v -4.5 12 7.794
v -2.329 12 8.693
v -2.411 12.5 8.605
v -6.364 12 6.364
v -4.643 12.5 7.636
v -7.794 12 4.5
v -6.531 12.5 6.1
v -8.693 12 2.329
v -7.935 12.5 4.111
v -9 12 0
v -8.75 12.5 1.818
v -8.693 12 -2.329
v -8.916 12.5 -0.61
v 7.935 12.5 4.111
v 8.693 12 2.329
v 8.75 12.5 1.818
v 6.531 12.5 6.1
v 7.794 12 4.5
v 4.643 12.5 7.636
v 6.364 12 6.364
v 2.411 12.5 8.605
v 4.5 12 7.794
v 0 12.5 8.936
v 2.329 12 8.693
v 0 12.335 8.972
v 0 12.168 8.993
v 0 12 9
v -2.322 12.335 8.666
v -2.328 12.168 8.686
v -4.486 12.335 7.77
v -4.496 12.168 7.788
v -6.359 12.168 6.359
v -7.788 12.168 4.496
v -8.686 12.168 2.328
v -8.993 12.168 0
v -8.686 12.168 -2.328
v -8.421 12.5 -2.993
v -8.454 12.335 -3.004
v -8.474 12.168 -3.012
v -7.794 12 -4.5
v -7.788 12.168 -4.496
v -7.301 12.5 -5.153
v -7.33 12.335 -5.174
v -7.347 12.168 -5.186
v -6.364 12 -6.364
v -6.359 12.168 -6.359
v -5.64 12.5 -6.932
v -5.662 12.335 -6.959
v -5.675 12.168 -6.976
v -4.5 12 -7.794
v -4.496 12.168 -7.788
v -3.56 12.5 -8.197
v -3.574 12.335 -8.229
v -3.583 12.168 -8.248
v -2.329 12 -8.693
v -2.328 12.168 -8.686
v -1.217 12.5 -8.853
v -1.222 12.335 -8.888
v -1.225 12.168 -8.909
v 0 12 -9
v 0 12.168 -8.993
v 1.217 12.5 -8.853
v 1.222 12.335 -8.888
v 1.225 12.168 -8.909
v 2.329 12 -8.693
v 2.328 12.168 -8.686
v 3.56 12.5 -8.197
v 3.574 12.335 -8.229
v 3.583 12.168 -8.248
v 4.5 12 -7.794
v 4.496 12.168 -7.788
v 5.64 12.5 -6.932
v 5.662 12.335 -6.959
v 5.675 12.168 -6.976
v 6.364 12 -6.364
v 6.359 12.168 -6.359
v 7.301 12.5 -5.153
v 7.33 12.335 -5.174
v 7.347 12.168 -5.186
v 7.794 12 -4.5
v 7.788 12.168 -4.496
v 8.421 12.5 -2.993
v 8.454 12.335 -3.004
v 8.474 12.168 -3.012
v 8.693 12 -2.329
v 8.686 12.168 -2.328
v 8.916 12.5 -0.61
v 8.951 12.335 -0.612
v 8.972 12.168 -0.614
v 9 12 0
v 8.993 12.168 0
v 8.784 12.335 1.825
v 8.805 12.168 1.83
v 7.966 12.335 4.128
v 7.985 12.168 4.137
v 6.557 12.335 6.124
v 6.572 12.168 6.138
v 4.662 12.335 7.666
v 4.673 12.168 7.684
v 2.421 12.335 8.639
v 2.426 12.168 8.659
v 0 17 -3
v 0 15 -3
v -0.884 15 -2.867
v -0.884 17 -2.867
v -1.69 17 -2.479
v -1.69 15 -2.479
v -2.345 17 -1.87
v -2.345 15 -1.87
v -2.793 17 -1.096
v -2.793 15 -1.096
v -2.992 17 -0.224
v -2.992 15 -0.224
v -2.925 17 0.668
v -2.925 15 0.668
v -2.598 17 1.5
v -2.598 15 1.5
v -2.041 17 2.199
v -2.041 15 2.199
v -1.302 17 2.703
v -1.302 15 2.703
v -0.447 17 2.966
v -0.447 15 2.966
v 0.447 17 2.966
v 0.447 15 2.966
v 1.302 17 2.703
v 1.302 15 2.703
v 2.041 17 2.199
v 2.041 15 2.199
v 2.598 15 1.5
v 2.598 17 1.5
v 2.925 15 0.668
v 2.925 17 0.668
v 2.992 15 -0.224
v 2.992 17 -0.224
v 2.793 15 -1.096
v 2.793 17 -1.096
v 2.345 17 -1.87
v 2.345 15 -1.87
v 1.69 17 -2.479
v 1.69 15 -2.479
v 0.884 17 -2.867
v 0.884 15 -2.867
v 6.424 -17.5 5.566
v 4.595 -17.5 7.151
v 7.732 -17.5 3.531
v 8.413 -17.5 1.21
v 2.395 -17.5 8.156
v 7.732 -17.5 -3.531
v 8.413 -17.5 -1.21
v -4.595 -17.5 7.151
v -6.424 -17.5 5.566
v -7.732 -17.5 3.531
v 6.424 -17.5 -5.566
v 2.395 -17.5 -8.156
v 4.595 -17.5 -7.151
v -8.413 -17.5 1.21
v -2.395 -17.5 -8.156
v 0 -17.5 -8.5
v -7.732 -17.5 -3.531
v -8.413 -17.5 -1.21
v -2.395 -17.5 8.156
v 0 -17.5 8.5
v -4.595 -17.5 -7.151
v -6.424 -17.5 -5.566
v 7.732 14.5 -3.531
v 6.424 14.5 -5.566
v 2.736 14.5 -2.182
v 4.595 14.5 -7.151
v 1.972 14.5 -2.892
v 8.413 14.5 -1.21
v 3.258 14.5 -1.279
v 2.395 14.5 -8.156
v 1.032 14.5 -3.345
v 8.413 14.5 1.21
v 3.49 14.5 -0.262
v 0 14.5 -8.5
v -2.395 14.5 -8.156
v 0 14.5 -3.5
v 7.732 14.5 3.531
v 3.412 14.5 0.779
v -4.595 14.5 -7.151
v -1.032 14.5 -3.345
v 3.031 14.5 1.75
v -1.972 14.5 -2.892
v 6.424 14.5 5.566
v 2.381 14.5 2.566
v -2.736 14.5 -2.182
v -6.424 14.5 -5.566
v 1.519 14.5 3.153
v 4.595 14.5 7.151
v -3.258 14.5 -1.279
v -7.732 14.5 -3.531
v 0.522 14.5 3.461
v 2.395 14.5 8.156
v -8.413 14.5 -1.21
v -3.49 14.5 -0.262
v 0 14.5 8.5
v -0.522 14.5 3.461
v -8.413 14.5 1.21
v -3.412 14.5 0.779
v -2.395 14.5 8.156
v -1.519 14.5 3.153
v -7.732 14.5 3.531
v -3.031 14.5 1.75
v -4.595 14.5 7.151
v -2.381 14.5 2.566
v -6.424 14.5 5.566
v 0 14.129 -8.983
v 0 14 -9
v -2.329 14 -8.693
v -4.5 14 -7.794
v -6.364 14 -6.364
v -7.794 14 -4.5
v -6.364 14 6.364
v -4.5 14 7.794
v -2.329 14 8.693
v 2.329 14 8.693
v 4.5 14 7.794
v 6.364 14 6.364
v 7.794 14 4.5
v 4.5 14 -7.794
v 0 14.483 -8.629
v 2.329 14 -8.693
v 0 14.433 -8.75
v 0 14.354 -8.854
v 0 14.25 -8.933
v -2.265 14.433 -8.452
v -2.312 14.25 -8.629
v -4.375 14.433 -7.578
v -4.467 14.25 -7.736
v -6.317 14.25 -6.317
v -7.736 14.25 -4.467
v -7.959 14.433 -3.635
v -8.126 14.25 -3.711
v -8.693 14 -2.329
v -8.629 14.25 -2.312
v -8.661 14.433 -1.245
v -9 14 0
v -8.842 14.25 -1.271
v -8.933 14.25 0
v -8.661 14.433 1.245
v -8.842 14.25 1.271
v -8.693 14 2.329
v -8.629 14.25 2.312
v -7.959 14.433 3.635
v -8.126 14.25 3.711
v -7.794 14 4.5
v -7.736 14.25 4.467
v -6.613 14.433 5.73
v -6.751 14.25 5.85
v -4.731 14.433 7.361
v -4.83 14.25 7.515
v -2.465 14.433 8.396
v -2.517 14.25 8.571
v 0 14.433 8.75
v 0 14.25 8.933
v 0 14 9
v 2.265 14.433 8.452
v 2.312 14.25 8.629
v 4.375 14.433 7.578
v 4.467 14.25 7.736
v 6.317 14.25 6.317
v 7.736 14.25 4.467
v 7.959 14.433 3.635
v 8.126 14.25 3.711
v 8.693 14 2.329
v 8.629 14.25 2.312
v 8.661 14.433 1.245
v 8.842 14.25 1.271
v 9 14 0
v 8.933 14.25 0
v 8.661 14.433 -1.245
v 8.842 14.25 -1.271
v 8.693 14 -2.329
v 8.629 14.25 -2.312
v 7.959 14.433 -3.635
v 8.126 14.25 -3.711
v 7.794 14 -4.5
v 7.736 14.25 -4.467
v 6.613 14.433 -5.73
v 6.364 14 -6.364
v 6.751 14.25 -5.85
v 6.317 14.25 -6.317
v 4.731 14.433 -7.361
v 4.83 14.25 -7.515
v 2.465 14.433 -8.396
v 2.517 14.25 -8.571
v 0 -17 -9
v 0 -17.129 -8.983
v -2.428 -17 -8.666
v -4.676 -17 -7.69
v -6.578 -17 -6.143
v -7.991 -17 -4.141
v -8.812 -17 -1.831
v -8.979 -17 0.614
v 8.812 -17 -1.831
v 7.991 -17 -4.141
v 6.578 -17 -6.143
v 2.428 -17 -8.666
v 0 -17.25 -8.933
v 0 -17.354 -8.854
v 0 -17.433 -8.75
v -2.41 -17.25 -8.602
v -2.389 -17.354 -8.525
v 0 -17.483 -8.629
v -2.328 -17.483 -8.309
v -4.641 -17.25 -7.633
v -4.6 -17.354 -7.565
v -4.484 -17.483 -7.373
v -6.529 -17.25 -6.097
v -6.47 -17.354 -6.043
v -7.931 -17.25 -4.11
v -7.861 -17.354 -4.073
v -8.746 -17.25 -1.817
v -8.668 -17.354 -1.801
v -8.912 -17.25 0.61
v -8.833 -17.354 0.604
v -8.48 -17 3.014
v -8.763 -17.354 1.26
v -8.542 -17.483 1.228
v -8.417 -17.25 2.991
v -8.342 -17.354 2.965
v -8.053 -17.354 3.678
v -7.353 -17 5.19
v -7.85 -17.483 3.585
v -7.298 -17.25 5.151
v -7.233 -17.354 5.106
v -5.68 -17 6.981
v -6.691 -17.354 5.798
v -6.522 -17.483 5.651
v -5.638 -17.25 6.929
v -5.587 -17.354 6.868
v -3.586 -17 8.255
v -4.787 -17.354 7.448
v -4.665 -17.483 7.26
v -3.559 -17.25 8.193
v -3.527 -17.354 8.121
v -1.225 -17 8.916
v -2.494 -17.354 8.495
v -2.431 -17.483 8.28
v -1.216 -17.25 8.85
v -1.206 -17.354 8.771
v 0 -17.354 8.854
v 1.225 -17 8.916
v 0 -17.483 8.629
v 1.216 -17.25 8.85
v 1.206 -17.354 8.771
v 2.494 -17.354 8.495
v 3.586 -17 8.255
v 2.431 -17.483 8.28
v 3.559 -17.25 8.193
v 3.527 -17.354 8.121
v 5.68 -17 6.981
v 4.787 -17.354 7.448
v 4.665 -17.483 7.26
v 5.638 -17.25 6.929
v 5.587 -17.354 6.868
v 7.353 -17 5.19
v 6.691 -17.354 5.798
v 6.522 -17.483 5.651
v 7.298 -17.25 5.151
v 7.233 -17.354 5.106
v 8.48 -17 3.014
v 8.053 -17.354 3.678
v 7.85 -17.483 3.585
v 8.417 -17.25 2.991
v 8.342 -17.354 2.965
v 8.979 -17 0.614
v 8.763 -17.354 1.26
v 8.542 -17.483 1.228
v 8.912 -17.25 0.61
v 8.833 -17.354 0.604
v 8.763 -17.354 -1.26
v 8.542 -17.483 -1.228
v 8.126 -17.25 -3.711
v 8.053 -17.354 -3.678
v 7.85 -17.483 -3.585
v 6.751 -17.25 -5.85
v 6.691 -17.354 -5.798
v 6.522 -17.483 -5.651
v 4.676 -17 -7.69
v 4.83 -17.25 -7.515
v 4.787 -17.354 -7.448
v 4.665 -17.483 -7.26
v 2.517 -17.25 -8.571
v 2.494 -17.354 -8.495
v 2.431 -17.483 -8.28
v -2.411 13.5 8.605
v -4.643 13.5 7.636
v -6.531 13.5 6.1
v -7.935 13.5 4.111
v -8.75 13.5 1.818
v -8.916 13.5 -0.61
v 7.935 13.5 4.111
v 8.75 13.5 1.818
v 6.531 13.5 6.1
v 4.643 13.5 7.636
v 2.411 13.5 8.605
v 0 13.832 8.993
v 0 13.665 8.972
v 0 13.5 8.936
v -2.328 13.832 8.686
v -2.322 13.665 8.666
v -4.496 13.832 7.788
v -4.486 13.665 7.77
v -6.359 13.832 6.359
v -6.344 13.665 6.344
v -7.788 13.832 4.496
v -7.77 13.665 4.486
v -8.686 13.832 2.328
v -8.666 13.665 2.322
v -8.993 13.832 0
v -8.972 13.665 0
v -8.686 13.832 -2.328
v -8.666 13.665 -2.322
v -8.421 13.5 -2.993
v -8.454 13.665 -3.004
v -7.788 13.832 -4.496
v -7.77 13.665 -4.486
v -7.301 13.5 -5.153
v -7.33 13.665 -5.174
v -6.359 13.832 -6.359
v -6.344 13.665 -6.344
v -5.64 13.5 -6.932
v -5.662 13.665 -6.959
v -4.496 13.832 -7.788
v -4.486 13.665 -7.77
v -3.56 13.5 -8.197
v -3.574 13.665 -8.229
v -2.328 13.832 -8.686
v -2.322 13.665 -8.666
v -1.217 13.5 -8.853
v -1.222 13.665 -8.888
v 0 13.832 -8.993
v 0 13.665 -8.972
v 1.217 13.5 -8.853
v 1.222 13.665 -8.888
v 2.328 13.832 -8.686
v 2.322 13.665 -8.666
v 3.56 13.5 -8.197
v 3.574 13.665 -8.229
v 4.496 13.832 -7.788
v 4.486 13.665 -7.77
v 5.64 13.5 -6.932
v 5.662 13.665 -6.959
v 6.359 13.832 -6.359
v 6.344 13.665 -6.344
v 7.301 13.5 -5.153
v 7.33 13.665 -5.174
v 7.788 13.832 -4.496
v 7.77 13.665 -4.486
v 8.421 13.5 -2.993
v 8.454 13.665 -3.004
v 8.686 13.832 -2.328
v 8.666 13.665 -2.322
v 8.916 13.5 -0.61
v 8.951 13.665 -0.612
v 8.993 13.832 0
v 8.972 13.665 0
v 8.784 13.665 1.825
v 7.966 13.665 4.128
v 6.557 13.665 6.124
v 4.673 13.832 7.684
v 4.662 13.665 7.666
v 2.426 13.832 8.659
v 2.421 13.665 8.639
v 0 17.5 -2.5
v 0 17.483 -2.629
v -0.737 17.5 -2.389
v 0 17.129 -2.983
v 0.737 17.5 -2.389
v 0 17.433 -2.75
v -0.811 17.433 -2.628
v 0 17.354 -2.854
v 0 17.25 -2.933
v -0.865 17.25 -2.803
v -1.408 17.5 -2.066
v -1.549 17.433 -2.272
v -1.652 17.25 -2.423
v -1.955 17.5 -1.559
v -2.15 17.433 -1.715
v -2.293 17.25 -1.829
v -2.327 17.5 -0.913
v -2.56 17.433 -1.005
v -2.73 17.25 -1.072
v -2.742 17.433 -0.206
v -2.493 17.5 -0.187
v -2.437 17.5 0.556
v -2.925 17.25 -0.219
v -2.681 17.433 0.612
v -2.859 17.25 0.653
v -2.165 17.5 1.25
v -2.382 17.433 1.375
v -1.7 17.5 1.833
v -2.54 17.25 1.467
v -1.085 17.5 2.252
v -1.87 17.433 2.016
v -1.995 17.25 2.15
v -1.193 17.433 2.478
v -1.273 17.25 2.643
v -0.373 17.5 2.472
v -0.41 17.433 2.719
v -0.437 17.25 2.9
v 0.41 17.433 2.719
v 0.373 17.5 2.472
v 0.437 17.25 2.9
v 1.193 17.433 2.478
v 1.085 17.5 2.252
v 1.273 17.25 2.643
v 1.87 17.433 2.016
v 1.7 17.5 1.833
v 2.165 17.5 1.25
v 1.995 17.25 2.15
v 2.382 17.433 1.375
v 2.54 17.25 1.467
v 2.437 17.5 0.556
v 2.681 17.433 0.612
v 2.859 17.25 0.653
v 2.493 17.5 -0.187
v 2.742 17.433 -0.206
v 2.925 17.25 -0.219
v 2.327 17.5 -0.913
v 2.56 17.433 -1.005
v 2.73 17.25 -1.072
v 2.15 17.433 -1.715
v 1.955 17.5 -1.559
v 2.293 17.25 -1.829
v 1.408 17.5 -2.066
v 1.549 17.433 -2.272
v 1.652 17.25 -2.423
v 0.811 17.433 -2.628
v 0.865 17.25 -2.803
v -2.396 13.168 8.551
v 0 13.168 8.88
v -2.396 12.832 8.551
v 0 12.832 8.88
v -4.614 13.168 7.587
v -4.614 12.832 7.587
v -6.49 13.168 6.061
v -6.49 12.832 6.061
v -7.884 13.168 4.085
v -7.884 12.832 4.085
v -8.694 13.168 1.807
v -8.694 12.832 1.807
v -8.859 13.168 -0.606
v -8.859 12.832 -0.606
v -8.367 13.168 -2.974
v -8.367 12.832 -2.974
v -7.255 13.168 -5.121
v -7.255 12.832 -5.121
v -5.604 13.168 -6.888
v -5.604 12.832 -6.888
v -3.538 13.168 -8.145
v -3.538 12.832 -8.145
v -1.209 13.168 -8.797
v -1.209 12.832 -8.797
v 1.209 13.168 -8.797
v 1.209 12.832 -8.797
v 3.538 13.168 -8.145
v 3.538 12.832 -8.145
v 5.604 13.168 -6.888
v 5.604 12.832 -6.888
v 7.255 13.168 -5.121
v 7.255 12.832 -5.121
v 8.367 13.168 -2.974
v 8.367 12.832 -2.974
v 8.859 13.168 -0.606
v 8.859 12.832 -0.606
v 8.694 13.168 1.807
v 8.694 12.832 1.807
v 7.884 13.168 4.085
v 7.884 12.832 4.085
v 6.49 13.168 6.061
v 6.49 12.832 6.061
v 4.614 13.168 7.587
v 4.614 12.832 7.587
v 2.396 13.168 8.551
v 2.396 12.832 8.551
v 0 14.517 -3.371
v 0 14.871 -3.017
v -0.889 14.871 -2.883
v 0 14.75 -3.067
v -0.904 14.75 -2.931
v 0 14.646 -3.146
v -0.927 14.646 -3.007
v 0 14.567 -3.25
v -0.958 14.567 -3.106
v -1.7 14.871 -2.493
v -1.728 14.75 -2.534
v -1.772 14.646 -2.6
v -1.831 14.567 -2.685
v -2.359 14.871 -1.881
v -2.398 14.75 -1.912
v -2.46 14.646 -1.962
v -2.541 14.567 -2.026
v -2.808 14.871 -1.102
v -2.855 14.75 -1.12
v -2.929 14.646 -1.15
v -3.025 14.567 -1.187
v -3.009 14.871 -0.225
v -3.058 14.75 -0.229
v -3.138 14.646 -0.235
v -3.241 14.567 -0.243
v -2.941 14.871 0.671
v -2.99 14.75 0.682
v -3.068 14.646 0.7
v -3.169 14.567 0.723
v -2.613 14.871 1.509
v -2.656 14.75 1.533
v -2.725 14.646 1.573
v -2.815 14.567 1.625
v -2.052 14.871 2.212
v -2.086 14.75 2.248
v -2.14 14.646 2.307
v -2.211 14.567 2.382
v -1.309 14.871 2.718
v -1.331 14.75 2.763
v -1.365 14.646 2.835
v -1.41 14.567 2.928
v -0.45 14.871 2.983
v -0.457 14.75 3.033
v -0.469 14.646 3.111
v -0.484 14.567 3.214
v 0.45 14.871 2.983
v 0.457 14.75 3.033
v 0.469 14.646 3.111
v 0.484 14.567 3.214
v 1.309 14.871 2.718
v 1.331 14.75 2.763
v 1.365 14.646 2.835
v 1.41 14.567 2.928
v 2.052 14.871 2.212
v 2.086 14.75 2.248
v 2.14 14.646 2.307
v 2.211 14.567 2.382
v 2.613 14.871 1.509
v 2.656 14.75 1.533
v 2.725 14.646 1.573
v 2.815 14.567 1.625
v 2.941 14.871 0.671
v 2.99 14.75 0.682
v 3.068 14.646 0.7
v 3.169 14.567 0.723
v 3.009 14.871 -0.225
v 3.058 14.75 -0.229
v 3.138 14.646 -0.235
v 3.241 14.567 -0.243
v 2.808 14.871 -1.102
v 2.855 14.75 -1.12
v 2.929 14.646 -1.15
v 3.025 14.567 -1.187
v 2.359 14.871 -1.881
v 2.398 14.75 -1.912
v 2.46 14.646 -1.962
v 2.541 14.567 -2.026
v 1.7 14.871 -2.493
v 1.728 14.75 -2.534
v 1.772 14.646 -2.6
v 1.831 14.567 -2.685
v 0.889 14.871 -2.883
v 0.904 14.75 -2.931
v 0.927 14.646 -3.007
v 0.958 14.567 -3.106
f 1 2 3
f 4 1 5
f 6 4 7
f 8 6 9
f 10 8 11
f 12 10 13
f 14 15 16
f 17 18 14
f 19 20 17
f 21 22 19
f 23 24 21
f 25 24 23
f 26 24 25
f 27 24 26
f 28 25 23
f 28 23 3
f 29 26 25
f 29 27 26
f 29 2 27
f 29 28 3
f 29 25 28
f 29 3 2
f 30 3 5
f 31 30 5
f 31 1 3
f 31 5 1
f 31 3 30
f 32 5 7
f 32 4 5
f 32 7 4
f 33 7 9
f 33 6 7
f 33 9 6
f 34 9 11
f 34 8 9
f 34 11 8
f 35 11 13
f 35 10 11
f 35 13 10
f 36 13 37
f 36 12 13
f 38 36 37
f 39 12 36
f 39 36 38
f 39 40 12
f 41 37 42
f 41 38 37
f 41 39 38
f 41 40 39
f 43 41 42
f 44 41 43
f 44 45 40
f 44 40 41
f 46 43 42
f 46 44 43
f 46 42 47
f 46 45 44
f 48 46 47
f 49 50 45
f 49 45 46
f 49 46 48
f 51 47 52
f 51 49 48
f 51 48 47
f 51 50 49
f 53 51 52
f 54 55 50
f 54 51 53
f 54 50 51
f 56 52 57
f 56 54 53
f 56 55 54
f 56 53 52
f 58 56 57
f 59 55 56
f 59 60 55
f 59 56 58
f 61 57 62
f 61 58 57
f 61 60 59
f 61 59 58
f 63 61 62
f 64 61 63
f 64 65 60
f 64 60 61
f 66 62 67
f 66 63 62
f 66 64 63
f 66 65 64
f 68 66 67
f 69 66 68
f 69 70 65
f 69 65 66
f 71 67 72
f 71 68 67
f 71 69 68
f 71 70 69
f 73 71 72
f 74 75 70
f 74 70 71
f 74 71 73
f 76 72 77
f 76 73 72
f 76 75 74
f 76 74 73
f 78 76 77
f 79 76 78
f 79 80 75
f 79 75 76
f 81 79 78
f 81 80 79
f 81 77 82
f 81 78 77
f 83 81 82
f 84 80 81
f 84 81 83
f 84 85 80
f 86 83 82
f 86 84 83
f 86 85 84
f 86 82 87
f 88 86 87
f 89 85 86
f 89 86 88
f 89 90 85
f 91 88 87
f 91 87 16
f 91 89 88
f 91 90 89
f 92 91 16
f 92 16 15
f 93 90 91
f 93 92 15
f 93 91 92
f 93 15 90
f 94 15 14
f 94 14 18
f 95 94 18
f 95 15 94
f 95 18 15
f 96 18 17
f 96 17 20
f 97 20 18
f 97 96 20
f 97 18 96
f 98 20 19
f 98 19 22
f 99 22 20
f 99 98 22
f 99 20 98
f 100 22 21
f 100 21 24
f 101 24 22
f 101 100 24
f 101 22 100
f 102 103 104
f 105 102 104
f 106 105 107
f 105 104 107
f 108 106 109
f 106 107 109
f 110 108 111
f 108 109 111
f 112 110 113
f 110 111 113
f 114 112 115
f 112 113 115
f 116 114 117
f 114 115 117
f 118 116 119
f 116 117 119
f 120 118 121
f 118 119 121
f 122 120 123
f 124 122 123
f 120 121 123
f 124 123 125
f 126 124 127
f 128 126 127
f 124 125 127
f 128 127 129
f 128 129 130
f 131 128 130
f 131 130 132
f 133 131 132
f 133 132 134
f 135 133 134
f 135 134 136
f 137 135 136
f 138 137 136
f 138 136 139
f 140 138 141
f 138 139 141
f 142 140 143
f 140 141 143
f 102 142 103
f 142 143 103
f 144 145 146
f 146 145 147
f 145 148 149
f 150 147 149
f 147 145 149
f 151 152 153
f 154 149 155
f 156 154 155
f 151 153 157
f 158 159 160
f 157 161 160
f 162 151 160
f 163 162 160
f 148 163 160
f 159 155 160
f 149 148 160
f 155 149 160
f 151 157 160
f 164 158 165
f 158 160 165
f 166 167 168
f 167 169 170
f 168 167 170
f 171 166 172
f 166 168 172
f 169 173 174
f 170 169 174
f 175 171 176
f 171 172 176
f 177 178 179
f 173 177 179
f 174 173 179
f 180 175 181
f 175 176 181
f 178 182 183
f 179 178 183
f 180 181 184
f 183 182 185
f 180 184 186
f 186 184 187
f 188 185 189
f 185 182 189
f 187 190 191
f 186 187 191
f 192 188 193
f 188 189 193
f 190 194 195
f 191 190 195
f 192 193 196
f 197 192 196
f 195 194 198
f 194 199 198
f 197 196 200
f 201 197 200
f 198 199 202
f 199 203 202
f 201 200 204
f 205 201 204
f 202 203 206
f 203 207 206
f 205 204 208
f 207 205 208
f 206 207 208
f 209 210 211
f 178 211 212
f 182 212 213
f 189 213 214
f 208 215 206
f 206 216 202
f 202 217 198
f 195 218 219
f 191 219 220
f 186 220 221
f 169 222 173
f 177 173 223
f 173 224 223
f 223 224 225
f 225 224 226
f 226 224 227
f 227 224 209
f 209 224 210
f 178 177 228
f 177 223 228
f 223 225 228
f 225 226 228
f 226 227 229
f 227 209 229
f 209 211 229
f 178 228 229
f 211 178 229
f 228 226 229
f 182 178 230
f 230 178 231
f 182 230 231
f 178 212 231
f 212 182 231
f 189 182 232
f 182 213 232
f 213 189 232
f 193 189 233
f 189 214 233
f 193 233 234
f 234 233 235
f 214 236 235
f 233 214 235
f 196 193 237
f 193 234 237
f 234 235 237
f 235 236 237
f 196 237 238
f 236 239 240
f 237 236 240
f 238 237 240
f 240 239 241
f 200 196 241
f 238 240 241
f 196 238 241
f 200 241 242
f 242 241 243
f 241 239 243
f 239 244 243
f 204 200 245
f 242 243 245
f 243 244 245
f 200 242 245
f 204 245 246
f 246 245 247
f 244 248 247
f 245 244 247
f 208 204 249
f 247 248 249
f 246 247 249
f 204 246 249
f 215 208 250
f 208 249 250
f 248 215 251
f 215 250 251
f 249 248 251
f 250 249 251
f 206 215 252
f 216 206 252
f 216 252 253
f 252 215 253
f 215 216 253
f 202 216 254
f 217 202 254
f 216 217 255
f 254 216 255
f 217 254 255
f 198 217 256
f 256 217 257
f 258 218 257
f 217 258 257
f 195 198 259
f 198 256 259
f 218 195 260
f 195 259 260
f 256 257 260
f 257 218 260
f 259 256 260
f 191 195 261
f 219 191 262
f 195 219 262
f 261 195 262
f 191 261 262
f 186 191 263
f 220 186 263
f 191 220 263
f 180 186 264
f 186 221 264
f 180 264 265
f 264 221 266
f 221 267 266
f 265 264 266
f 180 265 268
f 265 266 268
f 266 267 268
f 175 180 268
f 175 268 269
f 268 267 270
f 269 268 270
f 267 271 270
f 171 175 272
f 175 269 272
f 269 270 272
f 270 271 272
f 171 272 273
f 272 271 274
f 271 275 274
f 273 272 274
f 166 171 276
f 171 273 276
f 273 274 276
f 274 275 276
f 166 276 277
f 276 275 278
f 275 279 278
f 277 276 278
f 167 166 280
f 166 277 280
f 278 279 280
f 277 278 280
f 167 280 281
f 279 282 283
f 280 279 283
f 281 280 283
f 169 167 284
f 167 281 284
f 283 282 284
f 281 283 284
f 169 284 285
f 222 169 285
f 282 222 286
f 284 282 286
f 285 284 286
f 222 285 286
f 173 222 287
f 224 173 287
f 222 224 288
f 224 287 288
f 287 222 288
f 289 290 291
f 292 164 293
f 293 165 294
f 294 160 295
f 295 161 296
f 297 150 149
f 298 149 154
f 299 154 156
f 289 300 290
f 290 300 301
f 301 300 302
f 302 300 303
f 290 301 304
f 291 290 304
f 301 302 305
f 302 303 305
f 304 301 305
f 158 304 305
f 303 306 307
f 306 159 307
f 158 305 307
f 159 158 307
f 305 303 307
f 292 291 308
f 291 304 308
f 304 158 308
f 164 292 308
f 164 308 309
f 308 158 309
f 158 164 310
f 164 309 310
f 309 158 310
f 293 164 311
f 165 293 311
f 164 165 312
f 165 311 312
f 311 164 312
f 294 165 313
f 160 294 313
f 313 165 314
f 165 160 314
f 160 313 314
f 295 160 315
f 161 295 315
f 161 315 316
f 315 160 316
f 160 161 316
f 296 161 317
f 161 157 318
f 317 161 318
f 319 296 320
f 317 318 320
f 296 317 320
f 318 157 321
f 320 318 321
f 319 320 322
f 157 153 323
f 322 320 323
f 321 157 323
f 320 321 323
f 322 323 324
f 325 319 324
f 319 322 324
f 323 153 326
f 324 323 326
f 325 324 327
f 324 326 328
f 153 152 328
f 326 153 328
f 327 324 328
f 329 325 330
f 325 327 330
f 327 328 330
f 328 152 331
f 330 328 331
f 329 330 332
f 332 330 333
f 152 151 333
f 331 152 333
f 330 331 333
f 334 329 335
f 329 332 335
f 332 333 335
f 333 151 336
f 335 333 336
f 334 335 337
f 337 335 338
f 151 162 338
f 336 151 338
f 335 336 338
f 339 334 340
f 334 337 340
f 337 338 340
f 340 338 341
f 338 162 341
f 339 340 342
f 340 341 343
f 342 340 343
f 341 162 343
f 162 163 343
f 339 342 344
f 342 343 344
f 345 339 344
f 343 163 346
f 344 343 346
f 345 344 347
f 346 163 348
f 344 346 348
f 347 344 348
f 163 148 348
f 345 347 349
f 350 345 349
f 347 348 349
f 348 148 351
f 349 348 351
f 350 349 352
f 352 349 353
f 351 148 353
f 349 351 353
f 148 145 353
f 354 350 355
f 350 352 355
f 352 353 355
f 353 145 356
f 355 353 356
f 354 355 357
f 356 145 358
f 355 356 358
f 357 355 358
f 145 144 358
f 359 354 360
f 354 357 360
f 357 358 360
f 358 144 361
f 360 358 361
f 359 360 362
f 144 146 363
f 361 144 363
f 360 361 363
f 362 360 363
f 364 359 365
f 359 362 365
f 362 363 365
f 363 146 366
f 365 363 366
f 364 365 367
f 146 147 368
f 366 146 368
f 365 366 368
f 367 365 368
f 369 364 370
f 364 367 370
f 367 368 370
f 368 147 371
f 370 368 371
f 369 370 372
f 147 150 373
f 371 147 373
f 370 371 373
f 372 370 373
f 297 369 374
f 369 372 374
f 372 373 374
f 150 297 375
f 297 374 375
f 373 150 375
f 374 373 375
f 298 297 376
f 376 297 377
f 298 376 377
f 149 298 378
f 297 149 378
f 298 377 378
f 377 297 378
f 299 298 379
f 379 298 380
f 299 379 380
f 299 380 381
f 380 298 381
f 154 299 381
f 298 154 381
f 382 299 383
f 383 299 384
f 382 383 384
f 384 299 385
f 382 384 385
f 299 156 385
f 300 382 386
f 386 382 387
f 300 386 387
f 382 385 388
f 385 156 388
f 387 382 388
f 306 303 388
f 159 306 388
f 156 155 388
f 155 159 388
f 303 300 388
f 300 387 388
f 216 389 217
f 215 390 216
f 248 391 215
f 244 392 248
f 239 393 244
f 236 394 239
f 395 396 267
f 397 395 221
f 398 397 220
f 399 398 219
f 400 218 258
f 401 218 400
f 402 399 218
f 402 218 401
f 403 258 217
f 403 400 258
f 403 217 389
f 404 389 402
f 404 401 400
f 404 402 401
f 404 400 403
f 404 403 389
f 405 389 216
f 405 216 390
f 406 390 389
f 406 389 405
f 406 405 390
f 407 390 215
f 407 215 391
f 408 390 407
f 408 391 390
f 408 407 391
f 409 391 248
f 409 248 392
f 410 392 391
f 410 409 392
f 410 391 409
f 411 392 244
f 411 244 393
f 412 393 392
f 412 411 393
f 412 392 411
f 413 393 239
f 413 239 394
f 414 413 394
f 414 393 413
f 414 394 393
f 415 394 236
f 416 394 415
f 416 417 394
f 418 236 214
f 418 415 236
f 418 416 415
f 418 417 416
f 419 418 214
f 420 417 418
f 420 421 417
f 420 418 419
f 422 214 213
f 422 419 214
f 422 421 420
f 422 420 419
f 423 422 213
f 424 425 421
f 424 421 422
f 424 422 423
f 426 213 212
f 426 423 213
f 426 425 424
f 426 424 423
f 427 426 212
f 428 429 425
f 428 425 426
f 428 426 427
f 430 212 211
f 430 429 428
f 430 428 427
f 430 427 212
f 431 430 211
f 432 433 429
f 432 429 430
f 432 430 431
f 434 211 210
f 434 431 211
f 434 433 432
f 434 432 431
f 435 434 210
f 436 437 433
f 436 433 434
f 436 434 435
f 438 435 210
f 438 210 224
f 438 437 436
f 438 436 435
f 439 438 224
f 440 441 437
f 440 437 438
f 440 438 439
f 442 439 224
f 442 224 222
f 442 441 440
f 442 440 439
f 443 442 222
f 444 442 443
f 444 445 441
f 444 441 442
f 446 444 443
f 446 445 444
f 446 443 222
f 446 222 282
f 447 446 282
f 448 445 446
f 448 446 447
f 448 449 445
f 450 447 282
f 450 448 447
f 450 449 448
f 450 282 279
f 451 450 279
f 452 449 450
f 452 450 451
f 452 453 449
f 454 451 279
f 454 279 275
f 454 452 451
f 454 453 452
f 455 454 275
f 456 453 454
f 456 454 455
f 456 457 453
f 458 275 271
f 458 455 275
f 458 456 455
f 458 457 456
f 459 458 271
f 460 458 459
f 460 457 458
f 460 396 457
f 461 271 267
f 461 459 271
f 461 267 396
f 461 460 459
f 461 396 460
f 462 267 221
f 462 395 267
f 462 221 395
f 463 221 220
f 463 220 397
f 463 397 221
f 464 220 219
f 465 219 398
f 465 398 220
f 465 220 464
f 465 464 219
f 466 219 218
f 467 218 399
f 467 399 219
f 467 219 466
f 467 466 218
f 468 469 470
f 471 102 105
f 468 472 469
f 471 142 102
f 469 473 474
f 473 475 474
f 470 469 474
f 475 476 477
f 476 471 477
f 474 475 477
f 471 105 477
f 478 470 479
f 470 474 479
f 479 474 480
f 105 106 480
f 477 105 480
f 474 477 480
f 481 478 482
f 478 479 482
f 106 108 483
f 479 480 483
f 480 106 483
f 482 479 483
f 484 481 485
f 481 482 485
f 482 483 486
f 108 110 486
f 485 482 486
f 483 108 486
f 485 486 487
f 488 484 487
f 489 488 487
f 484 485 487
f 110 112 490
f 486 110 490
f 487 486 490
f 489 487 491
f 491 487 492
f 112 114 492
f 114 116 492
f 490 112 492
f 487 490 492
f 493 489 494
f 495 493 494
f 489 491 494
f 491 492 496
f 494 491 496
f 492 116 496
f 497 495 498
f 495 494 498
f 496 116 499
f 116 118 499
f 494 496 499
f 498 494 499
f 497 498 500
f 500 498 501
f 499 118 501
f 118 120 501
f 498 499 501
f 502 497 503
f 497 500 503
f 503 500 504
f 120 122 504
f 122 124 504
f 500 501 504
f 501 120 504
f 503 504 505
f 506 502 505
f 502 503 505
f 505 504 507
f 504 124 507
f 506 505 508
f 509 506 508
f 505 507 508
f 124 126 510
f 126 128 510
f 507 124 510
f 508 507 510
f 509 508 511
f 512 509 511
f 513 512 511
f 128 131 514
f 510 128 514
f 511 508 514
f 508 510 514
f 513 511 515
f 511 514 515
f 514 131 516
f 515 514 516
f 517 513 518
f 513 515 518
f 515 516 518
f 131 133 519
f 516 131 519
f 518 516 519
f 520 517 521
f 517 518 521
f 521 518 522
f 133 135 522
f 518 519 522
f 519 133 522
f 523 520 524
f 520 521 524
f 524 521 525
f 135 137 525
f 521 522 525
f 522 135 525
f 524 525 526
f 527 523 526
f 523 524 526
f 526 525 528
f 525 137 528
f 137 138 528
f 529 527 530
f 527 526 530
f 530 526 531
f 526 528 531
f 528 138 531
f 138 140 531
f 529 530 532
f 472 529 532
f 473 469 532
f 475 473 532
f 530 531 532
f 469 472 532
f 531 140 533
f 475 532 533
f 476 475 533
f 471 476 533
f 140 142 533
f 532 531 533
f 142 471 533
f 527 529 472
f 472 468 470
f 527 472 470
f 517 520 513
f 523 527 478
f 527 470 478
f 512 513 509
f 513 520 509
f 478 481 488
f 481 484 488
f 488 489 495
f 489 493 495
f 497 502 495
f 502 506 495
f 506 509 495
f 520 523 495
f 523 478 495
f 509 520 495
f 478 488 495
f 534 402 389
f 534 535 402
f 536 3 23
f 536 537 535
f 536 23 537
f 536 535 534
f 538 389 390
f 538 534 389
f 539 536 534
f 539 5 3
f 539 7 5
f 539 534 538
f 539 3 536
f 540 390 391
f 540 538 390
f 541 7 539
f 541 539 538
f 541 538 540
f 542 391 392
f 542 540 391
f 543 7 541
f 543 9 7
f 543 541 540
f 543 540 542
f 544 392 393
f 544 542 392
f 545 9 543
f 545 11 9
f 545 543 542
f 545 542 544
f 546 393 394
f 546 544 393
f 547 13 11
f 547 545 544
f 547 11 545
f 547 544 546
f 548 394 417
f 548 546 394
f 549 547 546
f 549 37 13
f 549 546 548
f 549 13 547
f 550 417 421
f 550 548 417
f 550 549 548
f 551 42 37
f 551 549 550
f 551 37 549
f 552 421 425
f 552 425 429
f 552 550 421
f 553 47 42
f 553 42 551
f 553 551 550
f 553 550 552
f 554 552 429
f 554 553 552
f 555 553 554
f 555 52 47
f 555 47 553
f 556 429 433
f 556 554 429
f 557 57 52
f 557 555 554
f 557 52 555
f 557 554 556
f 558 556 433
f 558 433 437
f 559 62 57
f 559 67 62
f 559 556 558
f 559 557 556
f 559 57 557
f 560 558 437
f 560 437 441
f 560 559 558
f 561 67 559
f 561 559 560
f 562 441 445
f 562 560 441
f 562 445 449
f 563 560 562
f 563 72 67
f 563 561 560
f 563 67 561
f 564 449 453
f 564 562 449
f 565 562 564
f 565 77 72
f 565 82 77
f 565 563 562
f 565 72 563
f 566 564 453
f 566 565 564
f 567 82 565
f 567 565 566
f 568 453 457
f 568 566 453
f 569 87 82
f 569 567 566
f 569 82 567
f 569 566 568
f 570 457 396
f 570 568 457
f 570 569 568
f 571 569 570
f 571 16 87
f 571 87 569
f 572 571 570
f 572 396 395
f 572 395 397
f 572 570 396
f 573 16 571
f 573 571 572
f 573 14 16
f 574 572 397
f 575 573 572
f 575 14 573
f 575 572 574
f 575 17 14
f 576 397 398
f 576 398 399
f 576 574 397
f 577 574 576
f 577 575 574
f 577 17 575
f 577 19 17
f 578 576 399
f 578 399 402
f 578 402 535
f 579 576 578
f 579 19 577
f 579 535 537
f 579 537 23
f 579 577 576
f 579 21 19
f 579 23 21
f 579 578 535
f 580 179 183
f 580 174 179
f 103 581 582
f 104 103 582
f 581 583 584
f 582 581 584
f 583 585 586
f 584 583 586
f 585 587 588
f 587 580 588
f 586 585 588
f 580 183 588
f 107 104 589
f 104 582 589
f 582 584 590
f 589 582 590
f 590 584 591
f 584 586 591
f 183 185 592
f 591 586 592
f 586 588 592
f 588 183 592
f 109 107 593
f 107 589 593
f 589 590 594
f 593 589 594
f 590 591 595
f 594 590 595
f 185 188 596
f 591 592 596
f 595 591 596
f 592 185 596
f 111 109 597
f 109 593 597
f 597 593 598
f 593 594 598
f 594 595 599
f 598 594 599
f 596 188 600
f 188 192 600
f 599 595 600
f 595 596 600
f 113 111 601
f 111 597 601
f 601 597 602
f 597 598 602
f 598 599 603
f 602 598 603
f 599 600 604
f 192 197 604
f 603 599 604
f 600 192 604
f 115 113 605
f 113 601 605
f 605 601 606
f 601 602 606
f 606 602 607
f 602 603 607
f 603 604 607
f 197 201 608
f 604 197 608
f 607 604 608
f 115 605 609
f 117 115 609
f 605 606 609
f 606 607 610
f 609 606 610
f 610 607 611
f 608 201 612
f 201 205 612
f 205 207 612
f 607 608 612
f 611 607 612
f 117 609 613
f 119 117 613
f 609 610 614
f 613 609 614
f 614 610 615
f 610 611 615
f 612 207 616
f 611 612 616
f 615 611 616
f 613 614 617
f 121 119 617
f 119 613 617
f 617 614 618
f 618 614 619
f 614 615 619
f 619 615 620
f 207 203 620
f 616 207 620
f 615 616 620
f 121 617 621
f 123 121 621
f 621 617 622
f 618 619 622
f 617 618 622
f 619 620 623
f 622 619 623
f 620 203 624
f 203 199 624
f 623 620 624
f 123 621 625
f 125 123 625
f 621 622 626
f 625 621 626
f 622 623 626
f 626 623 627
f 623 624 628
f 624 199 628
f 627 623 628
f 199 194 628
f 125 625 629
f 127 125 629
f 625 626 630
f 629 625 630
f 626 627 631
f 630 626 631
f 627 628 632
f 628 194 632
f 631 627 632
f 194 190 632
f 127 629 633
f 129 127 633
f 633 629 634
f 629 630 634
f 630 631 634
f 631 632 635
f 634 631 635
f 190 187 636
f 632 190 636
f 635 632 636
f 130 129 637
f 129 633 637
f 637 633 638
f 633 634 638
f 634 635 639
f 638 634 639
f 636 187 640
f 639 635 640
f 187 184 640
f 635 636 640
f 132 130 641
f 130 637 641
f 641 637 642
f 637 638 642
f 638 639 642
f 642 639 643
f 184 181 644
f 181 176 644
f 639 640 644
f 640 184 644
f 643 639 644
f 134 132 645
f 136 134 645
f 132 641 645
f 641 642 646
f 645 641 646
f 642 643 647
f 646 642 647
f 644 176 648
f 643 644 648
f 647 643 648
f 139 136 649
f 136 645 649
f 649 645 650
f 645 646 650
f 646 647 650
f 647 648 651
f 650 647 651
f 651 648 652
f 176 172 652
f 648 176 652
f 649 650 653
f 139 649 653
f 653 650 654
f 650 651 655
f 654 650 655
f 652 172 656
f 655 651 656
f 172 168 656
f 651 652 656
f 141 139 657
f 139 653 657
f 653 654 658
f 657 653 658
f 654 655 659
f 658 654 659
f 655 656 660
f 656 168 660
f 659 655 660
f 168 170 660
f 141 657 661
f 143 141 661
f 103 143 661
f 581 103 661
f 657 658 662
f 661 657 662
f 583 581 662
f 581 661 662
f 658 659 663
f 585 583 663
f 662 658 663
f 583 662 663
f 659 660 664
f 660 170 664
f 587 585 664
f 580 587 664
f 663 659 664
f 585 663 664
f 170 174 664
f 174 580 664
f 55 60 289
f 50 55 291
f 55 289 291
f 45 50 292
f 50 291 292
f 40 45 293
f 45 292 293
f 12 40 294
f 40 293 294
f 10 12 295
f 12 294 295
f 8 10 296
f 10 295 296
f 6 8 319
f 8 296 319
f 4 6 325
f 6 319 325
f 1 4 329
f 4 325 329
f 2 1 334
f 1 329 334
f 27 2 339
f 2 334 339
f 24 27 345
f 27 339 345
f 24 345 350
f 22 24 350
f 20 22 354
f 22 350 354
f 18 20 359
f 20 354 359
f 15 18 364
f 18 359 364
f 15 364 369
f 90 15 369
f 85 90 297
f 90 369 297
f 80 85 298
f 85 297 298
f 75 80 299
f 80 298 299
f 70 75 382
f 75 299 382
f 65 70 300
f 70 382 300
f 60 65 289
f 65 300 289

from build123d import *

# Parameters (mm, degrees)
FILLET1_R = 0.5


with BuildPart() as part:
    # Sketch1 → Revolve1 (revolve)
    with BuildSketch(Plane.XY, mode=Mode.PRIVATE) as revolve1_sk:
        Polygon((0, -17.5), (0, 17.5), (3, 17.5), (3, 14.5), (9, 14.5), (9, -17.5), align=None)
    revolve(revolve1_sk.sketch.rotate(Axis((0, -17.5, 0), (0, 1, 0)), 90), axis=Axis((0, -17.5, 0), (0, 1, 0)))

    # Fillet1
    fillet1_edges = [part.edges().sort_by_distance(p)[0] for p in [
        (0, -17.5, 9),
        (0, 14.5, 9),
        (0, 14.5, 3),
        (0, 17.5, 3),
    ]]
    fillet(fillet1_edges, radius=FILLET1_R)

    # Sketch2 → Cut-Revolve1 (revolve, cut)
    with BuildSketch(Plane.XY, mode=Mode.PRIVATE) as cut_revolve1_sk:
        with BuildLine():
            Line((9, 12), (9, 14))
            ThreePointArc((9, 14), (8.984059393, 13.747991415), (8.936491673, 13.5))
            ThreePointArc((8.936491673, 13.5), (8.872983346, 13), (8.936491673, 12.5))
            ThreePointArc((8.936491673, 12.5), (8.984059393, 12.252008585), (9, 12))
        make_face()
    revolve(cut_revolve1_sk.sketch.rotate(Axis((0, 17.5, 0), (0, -1, 0)), 90), axis=Axis((0, 17.5, 0), (0, -1, 0)), mode=Mode.SUBTRACT)


solid = part.part
